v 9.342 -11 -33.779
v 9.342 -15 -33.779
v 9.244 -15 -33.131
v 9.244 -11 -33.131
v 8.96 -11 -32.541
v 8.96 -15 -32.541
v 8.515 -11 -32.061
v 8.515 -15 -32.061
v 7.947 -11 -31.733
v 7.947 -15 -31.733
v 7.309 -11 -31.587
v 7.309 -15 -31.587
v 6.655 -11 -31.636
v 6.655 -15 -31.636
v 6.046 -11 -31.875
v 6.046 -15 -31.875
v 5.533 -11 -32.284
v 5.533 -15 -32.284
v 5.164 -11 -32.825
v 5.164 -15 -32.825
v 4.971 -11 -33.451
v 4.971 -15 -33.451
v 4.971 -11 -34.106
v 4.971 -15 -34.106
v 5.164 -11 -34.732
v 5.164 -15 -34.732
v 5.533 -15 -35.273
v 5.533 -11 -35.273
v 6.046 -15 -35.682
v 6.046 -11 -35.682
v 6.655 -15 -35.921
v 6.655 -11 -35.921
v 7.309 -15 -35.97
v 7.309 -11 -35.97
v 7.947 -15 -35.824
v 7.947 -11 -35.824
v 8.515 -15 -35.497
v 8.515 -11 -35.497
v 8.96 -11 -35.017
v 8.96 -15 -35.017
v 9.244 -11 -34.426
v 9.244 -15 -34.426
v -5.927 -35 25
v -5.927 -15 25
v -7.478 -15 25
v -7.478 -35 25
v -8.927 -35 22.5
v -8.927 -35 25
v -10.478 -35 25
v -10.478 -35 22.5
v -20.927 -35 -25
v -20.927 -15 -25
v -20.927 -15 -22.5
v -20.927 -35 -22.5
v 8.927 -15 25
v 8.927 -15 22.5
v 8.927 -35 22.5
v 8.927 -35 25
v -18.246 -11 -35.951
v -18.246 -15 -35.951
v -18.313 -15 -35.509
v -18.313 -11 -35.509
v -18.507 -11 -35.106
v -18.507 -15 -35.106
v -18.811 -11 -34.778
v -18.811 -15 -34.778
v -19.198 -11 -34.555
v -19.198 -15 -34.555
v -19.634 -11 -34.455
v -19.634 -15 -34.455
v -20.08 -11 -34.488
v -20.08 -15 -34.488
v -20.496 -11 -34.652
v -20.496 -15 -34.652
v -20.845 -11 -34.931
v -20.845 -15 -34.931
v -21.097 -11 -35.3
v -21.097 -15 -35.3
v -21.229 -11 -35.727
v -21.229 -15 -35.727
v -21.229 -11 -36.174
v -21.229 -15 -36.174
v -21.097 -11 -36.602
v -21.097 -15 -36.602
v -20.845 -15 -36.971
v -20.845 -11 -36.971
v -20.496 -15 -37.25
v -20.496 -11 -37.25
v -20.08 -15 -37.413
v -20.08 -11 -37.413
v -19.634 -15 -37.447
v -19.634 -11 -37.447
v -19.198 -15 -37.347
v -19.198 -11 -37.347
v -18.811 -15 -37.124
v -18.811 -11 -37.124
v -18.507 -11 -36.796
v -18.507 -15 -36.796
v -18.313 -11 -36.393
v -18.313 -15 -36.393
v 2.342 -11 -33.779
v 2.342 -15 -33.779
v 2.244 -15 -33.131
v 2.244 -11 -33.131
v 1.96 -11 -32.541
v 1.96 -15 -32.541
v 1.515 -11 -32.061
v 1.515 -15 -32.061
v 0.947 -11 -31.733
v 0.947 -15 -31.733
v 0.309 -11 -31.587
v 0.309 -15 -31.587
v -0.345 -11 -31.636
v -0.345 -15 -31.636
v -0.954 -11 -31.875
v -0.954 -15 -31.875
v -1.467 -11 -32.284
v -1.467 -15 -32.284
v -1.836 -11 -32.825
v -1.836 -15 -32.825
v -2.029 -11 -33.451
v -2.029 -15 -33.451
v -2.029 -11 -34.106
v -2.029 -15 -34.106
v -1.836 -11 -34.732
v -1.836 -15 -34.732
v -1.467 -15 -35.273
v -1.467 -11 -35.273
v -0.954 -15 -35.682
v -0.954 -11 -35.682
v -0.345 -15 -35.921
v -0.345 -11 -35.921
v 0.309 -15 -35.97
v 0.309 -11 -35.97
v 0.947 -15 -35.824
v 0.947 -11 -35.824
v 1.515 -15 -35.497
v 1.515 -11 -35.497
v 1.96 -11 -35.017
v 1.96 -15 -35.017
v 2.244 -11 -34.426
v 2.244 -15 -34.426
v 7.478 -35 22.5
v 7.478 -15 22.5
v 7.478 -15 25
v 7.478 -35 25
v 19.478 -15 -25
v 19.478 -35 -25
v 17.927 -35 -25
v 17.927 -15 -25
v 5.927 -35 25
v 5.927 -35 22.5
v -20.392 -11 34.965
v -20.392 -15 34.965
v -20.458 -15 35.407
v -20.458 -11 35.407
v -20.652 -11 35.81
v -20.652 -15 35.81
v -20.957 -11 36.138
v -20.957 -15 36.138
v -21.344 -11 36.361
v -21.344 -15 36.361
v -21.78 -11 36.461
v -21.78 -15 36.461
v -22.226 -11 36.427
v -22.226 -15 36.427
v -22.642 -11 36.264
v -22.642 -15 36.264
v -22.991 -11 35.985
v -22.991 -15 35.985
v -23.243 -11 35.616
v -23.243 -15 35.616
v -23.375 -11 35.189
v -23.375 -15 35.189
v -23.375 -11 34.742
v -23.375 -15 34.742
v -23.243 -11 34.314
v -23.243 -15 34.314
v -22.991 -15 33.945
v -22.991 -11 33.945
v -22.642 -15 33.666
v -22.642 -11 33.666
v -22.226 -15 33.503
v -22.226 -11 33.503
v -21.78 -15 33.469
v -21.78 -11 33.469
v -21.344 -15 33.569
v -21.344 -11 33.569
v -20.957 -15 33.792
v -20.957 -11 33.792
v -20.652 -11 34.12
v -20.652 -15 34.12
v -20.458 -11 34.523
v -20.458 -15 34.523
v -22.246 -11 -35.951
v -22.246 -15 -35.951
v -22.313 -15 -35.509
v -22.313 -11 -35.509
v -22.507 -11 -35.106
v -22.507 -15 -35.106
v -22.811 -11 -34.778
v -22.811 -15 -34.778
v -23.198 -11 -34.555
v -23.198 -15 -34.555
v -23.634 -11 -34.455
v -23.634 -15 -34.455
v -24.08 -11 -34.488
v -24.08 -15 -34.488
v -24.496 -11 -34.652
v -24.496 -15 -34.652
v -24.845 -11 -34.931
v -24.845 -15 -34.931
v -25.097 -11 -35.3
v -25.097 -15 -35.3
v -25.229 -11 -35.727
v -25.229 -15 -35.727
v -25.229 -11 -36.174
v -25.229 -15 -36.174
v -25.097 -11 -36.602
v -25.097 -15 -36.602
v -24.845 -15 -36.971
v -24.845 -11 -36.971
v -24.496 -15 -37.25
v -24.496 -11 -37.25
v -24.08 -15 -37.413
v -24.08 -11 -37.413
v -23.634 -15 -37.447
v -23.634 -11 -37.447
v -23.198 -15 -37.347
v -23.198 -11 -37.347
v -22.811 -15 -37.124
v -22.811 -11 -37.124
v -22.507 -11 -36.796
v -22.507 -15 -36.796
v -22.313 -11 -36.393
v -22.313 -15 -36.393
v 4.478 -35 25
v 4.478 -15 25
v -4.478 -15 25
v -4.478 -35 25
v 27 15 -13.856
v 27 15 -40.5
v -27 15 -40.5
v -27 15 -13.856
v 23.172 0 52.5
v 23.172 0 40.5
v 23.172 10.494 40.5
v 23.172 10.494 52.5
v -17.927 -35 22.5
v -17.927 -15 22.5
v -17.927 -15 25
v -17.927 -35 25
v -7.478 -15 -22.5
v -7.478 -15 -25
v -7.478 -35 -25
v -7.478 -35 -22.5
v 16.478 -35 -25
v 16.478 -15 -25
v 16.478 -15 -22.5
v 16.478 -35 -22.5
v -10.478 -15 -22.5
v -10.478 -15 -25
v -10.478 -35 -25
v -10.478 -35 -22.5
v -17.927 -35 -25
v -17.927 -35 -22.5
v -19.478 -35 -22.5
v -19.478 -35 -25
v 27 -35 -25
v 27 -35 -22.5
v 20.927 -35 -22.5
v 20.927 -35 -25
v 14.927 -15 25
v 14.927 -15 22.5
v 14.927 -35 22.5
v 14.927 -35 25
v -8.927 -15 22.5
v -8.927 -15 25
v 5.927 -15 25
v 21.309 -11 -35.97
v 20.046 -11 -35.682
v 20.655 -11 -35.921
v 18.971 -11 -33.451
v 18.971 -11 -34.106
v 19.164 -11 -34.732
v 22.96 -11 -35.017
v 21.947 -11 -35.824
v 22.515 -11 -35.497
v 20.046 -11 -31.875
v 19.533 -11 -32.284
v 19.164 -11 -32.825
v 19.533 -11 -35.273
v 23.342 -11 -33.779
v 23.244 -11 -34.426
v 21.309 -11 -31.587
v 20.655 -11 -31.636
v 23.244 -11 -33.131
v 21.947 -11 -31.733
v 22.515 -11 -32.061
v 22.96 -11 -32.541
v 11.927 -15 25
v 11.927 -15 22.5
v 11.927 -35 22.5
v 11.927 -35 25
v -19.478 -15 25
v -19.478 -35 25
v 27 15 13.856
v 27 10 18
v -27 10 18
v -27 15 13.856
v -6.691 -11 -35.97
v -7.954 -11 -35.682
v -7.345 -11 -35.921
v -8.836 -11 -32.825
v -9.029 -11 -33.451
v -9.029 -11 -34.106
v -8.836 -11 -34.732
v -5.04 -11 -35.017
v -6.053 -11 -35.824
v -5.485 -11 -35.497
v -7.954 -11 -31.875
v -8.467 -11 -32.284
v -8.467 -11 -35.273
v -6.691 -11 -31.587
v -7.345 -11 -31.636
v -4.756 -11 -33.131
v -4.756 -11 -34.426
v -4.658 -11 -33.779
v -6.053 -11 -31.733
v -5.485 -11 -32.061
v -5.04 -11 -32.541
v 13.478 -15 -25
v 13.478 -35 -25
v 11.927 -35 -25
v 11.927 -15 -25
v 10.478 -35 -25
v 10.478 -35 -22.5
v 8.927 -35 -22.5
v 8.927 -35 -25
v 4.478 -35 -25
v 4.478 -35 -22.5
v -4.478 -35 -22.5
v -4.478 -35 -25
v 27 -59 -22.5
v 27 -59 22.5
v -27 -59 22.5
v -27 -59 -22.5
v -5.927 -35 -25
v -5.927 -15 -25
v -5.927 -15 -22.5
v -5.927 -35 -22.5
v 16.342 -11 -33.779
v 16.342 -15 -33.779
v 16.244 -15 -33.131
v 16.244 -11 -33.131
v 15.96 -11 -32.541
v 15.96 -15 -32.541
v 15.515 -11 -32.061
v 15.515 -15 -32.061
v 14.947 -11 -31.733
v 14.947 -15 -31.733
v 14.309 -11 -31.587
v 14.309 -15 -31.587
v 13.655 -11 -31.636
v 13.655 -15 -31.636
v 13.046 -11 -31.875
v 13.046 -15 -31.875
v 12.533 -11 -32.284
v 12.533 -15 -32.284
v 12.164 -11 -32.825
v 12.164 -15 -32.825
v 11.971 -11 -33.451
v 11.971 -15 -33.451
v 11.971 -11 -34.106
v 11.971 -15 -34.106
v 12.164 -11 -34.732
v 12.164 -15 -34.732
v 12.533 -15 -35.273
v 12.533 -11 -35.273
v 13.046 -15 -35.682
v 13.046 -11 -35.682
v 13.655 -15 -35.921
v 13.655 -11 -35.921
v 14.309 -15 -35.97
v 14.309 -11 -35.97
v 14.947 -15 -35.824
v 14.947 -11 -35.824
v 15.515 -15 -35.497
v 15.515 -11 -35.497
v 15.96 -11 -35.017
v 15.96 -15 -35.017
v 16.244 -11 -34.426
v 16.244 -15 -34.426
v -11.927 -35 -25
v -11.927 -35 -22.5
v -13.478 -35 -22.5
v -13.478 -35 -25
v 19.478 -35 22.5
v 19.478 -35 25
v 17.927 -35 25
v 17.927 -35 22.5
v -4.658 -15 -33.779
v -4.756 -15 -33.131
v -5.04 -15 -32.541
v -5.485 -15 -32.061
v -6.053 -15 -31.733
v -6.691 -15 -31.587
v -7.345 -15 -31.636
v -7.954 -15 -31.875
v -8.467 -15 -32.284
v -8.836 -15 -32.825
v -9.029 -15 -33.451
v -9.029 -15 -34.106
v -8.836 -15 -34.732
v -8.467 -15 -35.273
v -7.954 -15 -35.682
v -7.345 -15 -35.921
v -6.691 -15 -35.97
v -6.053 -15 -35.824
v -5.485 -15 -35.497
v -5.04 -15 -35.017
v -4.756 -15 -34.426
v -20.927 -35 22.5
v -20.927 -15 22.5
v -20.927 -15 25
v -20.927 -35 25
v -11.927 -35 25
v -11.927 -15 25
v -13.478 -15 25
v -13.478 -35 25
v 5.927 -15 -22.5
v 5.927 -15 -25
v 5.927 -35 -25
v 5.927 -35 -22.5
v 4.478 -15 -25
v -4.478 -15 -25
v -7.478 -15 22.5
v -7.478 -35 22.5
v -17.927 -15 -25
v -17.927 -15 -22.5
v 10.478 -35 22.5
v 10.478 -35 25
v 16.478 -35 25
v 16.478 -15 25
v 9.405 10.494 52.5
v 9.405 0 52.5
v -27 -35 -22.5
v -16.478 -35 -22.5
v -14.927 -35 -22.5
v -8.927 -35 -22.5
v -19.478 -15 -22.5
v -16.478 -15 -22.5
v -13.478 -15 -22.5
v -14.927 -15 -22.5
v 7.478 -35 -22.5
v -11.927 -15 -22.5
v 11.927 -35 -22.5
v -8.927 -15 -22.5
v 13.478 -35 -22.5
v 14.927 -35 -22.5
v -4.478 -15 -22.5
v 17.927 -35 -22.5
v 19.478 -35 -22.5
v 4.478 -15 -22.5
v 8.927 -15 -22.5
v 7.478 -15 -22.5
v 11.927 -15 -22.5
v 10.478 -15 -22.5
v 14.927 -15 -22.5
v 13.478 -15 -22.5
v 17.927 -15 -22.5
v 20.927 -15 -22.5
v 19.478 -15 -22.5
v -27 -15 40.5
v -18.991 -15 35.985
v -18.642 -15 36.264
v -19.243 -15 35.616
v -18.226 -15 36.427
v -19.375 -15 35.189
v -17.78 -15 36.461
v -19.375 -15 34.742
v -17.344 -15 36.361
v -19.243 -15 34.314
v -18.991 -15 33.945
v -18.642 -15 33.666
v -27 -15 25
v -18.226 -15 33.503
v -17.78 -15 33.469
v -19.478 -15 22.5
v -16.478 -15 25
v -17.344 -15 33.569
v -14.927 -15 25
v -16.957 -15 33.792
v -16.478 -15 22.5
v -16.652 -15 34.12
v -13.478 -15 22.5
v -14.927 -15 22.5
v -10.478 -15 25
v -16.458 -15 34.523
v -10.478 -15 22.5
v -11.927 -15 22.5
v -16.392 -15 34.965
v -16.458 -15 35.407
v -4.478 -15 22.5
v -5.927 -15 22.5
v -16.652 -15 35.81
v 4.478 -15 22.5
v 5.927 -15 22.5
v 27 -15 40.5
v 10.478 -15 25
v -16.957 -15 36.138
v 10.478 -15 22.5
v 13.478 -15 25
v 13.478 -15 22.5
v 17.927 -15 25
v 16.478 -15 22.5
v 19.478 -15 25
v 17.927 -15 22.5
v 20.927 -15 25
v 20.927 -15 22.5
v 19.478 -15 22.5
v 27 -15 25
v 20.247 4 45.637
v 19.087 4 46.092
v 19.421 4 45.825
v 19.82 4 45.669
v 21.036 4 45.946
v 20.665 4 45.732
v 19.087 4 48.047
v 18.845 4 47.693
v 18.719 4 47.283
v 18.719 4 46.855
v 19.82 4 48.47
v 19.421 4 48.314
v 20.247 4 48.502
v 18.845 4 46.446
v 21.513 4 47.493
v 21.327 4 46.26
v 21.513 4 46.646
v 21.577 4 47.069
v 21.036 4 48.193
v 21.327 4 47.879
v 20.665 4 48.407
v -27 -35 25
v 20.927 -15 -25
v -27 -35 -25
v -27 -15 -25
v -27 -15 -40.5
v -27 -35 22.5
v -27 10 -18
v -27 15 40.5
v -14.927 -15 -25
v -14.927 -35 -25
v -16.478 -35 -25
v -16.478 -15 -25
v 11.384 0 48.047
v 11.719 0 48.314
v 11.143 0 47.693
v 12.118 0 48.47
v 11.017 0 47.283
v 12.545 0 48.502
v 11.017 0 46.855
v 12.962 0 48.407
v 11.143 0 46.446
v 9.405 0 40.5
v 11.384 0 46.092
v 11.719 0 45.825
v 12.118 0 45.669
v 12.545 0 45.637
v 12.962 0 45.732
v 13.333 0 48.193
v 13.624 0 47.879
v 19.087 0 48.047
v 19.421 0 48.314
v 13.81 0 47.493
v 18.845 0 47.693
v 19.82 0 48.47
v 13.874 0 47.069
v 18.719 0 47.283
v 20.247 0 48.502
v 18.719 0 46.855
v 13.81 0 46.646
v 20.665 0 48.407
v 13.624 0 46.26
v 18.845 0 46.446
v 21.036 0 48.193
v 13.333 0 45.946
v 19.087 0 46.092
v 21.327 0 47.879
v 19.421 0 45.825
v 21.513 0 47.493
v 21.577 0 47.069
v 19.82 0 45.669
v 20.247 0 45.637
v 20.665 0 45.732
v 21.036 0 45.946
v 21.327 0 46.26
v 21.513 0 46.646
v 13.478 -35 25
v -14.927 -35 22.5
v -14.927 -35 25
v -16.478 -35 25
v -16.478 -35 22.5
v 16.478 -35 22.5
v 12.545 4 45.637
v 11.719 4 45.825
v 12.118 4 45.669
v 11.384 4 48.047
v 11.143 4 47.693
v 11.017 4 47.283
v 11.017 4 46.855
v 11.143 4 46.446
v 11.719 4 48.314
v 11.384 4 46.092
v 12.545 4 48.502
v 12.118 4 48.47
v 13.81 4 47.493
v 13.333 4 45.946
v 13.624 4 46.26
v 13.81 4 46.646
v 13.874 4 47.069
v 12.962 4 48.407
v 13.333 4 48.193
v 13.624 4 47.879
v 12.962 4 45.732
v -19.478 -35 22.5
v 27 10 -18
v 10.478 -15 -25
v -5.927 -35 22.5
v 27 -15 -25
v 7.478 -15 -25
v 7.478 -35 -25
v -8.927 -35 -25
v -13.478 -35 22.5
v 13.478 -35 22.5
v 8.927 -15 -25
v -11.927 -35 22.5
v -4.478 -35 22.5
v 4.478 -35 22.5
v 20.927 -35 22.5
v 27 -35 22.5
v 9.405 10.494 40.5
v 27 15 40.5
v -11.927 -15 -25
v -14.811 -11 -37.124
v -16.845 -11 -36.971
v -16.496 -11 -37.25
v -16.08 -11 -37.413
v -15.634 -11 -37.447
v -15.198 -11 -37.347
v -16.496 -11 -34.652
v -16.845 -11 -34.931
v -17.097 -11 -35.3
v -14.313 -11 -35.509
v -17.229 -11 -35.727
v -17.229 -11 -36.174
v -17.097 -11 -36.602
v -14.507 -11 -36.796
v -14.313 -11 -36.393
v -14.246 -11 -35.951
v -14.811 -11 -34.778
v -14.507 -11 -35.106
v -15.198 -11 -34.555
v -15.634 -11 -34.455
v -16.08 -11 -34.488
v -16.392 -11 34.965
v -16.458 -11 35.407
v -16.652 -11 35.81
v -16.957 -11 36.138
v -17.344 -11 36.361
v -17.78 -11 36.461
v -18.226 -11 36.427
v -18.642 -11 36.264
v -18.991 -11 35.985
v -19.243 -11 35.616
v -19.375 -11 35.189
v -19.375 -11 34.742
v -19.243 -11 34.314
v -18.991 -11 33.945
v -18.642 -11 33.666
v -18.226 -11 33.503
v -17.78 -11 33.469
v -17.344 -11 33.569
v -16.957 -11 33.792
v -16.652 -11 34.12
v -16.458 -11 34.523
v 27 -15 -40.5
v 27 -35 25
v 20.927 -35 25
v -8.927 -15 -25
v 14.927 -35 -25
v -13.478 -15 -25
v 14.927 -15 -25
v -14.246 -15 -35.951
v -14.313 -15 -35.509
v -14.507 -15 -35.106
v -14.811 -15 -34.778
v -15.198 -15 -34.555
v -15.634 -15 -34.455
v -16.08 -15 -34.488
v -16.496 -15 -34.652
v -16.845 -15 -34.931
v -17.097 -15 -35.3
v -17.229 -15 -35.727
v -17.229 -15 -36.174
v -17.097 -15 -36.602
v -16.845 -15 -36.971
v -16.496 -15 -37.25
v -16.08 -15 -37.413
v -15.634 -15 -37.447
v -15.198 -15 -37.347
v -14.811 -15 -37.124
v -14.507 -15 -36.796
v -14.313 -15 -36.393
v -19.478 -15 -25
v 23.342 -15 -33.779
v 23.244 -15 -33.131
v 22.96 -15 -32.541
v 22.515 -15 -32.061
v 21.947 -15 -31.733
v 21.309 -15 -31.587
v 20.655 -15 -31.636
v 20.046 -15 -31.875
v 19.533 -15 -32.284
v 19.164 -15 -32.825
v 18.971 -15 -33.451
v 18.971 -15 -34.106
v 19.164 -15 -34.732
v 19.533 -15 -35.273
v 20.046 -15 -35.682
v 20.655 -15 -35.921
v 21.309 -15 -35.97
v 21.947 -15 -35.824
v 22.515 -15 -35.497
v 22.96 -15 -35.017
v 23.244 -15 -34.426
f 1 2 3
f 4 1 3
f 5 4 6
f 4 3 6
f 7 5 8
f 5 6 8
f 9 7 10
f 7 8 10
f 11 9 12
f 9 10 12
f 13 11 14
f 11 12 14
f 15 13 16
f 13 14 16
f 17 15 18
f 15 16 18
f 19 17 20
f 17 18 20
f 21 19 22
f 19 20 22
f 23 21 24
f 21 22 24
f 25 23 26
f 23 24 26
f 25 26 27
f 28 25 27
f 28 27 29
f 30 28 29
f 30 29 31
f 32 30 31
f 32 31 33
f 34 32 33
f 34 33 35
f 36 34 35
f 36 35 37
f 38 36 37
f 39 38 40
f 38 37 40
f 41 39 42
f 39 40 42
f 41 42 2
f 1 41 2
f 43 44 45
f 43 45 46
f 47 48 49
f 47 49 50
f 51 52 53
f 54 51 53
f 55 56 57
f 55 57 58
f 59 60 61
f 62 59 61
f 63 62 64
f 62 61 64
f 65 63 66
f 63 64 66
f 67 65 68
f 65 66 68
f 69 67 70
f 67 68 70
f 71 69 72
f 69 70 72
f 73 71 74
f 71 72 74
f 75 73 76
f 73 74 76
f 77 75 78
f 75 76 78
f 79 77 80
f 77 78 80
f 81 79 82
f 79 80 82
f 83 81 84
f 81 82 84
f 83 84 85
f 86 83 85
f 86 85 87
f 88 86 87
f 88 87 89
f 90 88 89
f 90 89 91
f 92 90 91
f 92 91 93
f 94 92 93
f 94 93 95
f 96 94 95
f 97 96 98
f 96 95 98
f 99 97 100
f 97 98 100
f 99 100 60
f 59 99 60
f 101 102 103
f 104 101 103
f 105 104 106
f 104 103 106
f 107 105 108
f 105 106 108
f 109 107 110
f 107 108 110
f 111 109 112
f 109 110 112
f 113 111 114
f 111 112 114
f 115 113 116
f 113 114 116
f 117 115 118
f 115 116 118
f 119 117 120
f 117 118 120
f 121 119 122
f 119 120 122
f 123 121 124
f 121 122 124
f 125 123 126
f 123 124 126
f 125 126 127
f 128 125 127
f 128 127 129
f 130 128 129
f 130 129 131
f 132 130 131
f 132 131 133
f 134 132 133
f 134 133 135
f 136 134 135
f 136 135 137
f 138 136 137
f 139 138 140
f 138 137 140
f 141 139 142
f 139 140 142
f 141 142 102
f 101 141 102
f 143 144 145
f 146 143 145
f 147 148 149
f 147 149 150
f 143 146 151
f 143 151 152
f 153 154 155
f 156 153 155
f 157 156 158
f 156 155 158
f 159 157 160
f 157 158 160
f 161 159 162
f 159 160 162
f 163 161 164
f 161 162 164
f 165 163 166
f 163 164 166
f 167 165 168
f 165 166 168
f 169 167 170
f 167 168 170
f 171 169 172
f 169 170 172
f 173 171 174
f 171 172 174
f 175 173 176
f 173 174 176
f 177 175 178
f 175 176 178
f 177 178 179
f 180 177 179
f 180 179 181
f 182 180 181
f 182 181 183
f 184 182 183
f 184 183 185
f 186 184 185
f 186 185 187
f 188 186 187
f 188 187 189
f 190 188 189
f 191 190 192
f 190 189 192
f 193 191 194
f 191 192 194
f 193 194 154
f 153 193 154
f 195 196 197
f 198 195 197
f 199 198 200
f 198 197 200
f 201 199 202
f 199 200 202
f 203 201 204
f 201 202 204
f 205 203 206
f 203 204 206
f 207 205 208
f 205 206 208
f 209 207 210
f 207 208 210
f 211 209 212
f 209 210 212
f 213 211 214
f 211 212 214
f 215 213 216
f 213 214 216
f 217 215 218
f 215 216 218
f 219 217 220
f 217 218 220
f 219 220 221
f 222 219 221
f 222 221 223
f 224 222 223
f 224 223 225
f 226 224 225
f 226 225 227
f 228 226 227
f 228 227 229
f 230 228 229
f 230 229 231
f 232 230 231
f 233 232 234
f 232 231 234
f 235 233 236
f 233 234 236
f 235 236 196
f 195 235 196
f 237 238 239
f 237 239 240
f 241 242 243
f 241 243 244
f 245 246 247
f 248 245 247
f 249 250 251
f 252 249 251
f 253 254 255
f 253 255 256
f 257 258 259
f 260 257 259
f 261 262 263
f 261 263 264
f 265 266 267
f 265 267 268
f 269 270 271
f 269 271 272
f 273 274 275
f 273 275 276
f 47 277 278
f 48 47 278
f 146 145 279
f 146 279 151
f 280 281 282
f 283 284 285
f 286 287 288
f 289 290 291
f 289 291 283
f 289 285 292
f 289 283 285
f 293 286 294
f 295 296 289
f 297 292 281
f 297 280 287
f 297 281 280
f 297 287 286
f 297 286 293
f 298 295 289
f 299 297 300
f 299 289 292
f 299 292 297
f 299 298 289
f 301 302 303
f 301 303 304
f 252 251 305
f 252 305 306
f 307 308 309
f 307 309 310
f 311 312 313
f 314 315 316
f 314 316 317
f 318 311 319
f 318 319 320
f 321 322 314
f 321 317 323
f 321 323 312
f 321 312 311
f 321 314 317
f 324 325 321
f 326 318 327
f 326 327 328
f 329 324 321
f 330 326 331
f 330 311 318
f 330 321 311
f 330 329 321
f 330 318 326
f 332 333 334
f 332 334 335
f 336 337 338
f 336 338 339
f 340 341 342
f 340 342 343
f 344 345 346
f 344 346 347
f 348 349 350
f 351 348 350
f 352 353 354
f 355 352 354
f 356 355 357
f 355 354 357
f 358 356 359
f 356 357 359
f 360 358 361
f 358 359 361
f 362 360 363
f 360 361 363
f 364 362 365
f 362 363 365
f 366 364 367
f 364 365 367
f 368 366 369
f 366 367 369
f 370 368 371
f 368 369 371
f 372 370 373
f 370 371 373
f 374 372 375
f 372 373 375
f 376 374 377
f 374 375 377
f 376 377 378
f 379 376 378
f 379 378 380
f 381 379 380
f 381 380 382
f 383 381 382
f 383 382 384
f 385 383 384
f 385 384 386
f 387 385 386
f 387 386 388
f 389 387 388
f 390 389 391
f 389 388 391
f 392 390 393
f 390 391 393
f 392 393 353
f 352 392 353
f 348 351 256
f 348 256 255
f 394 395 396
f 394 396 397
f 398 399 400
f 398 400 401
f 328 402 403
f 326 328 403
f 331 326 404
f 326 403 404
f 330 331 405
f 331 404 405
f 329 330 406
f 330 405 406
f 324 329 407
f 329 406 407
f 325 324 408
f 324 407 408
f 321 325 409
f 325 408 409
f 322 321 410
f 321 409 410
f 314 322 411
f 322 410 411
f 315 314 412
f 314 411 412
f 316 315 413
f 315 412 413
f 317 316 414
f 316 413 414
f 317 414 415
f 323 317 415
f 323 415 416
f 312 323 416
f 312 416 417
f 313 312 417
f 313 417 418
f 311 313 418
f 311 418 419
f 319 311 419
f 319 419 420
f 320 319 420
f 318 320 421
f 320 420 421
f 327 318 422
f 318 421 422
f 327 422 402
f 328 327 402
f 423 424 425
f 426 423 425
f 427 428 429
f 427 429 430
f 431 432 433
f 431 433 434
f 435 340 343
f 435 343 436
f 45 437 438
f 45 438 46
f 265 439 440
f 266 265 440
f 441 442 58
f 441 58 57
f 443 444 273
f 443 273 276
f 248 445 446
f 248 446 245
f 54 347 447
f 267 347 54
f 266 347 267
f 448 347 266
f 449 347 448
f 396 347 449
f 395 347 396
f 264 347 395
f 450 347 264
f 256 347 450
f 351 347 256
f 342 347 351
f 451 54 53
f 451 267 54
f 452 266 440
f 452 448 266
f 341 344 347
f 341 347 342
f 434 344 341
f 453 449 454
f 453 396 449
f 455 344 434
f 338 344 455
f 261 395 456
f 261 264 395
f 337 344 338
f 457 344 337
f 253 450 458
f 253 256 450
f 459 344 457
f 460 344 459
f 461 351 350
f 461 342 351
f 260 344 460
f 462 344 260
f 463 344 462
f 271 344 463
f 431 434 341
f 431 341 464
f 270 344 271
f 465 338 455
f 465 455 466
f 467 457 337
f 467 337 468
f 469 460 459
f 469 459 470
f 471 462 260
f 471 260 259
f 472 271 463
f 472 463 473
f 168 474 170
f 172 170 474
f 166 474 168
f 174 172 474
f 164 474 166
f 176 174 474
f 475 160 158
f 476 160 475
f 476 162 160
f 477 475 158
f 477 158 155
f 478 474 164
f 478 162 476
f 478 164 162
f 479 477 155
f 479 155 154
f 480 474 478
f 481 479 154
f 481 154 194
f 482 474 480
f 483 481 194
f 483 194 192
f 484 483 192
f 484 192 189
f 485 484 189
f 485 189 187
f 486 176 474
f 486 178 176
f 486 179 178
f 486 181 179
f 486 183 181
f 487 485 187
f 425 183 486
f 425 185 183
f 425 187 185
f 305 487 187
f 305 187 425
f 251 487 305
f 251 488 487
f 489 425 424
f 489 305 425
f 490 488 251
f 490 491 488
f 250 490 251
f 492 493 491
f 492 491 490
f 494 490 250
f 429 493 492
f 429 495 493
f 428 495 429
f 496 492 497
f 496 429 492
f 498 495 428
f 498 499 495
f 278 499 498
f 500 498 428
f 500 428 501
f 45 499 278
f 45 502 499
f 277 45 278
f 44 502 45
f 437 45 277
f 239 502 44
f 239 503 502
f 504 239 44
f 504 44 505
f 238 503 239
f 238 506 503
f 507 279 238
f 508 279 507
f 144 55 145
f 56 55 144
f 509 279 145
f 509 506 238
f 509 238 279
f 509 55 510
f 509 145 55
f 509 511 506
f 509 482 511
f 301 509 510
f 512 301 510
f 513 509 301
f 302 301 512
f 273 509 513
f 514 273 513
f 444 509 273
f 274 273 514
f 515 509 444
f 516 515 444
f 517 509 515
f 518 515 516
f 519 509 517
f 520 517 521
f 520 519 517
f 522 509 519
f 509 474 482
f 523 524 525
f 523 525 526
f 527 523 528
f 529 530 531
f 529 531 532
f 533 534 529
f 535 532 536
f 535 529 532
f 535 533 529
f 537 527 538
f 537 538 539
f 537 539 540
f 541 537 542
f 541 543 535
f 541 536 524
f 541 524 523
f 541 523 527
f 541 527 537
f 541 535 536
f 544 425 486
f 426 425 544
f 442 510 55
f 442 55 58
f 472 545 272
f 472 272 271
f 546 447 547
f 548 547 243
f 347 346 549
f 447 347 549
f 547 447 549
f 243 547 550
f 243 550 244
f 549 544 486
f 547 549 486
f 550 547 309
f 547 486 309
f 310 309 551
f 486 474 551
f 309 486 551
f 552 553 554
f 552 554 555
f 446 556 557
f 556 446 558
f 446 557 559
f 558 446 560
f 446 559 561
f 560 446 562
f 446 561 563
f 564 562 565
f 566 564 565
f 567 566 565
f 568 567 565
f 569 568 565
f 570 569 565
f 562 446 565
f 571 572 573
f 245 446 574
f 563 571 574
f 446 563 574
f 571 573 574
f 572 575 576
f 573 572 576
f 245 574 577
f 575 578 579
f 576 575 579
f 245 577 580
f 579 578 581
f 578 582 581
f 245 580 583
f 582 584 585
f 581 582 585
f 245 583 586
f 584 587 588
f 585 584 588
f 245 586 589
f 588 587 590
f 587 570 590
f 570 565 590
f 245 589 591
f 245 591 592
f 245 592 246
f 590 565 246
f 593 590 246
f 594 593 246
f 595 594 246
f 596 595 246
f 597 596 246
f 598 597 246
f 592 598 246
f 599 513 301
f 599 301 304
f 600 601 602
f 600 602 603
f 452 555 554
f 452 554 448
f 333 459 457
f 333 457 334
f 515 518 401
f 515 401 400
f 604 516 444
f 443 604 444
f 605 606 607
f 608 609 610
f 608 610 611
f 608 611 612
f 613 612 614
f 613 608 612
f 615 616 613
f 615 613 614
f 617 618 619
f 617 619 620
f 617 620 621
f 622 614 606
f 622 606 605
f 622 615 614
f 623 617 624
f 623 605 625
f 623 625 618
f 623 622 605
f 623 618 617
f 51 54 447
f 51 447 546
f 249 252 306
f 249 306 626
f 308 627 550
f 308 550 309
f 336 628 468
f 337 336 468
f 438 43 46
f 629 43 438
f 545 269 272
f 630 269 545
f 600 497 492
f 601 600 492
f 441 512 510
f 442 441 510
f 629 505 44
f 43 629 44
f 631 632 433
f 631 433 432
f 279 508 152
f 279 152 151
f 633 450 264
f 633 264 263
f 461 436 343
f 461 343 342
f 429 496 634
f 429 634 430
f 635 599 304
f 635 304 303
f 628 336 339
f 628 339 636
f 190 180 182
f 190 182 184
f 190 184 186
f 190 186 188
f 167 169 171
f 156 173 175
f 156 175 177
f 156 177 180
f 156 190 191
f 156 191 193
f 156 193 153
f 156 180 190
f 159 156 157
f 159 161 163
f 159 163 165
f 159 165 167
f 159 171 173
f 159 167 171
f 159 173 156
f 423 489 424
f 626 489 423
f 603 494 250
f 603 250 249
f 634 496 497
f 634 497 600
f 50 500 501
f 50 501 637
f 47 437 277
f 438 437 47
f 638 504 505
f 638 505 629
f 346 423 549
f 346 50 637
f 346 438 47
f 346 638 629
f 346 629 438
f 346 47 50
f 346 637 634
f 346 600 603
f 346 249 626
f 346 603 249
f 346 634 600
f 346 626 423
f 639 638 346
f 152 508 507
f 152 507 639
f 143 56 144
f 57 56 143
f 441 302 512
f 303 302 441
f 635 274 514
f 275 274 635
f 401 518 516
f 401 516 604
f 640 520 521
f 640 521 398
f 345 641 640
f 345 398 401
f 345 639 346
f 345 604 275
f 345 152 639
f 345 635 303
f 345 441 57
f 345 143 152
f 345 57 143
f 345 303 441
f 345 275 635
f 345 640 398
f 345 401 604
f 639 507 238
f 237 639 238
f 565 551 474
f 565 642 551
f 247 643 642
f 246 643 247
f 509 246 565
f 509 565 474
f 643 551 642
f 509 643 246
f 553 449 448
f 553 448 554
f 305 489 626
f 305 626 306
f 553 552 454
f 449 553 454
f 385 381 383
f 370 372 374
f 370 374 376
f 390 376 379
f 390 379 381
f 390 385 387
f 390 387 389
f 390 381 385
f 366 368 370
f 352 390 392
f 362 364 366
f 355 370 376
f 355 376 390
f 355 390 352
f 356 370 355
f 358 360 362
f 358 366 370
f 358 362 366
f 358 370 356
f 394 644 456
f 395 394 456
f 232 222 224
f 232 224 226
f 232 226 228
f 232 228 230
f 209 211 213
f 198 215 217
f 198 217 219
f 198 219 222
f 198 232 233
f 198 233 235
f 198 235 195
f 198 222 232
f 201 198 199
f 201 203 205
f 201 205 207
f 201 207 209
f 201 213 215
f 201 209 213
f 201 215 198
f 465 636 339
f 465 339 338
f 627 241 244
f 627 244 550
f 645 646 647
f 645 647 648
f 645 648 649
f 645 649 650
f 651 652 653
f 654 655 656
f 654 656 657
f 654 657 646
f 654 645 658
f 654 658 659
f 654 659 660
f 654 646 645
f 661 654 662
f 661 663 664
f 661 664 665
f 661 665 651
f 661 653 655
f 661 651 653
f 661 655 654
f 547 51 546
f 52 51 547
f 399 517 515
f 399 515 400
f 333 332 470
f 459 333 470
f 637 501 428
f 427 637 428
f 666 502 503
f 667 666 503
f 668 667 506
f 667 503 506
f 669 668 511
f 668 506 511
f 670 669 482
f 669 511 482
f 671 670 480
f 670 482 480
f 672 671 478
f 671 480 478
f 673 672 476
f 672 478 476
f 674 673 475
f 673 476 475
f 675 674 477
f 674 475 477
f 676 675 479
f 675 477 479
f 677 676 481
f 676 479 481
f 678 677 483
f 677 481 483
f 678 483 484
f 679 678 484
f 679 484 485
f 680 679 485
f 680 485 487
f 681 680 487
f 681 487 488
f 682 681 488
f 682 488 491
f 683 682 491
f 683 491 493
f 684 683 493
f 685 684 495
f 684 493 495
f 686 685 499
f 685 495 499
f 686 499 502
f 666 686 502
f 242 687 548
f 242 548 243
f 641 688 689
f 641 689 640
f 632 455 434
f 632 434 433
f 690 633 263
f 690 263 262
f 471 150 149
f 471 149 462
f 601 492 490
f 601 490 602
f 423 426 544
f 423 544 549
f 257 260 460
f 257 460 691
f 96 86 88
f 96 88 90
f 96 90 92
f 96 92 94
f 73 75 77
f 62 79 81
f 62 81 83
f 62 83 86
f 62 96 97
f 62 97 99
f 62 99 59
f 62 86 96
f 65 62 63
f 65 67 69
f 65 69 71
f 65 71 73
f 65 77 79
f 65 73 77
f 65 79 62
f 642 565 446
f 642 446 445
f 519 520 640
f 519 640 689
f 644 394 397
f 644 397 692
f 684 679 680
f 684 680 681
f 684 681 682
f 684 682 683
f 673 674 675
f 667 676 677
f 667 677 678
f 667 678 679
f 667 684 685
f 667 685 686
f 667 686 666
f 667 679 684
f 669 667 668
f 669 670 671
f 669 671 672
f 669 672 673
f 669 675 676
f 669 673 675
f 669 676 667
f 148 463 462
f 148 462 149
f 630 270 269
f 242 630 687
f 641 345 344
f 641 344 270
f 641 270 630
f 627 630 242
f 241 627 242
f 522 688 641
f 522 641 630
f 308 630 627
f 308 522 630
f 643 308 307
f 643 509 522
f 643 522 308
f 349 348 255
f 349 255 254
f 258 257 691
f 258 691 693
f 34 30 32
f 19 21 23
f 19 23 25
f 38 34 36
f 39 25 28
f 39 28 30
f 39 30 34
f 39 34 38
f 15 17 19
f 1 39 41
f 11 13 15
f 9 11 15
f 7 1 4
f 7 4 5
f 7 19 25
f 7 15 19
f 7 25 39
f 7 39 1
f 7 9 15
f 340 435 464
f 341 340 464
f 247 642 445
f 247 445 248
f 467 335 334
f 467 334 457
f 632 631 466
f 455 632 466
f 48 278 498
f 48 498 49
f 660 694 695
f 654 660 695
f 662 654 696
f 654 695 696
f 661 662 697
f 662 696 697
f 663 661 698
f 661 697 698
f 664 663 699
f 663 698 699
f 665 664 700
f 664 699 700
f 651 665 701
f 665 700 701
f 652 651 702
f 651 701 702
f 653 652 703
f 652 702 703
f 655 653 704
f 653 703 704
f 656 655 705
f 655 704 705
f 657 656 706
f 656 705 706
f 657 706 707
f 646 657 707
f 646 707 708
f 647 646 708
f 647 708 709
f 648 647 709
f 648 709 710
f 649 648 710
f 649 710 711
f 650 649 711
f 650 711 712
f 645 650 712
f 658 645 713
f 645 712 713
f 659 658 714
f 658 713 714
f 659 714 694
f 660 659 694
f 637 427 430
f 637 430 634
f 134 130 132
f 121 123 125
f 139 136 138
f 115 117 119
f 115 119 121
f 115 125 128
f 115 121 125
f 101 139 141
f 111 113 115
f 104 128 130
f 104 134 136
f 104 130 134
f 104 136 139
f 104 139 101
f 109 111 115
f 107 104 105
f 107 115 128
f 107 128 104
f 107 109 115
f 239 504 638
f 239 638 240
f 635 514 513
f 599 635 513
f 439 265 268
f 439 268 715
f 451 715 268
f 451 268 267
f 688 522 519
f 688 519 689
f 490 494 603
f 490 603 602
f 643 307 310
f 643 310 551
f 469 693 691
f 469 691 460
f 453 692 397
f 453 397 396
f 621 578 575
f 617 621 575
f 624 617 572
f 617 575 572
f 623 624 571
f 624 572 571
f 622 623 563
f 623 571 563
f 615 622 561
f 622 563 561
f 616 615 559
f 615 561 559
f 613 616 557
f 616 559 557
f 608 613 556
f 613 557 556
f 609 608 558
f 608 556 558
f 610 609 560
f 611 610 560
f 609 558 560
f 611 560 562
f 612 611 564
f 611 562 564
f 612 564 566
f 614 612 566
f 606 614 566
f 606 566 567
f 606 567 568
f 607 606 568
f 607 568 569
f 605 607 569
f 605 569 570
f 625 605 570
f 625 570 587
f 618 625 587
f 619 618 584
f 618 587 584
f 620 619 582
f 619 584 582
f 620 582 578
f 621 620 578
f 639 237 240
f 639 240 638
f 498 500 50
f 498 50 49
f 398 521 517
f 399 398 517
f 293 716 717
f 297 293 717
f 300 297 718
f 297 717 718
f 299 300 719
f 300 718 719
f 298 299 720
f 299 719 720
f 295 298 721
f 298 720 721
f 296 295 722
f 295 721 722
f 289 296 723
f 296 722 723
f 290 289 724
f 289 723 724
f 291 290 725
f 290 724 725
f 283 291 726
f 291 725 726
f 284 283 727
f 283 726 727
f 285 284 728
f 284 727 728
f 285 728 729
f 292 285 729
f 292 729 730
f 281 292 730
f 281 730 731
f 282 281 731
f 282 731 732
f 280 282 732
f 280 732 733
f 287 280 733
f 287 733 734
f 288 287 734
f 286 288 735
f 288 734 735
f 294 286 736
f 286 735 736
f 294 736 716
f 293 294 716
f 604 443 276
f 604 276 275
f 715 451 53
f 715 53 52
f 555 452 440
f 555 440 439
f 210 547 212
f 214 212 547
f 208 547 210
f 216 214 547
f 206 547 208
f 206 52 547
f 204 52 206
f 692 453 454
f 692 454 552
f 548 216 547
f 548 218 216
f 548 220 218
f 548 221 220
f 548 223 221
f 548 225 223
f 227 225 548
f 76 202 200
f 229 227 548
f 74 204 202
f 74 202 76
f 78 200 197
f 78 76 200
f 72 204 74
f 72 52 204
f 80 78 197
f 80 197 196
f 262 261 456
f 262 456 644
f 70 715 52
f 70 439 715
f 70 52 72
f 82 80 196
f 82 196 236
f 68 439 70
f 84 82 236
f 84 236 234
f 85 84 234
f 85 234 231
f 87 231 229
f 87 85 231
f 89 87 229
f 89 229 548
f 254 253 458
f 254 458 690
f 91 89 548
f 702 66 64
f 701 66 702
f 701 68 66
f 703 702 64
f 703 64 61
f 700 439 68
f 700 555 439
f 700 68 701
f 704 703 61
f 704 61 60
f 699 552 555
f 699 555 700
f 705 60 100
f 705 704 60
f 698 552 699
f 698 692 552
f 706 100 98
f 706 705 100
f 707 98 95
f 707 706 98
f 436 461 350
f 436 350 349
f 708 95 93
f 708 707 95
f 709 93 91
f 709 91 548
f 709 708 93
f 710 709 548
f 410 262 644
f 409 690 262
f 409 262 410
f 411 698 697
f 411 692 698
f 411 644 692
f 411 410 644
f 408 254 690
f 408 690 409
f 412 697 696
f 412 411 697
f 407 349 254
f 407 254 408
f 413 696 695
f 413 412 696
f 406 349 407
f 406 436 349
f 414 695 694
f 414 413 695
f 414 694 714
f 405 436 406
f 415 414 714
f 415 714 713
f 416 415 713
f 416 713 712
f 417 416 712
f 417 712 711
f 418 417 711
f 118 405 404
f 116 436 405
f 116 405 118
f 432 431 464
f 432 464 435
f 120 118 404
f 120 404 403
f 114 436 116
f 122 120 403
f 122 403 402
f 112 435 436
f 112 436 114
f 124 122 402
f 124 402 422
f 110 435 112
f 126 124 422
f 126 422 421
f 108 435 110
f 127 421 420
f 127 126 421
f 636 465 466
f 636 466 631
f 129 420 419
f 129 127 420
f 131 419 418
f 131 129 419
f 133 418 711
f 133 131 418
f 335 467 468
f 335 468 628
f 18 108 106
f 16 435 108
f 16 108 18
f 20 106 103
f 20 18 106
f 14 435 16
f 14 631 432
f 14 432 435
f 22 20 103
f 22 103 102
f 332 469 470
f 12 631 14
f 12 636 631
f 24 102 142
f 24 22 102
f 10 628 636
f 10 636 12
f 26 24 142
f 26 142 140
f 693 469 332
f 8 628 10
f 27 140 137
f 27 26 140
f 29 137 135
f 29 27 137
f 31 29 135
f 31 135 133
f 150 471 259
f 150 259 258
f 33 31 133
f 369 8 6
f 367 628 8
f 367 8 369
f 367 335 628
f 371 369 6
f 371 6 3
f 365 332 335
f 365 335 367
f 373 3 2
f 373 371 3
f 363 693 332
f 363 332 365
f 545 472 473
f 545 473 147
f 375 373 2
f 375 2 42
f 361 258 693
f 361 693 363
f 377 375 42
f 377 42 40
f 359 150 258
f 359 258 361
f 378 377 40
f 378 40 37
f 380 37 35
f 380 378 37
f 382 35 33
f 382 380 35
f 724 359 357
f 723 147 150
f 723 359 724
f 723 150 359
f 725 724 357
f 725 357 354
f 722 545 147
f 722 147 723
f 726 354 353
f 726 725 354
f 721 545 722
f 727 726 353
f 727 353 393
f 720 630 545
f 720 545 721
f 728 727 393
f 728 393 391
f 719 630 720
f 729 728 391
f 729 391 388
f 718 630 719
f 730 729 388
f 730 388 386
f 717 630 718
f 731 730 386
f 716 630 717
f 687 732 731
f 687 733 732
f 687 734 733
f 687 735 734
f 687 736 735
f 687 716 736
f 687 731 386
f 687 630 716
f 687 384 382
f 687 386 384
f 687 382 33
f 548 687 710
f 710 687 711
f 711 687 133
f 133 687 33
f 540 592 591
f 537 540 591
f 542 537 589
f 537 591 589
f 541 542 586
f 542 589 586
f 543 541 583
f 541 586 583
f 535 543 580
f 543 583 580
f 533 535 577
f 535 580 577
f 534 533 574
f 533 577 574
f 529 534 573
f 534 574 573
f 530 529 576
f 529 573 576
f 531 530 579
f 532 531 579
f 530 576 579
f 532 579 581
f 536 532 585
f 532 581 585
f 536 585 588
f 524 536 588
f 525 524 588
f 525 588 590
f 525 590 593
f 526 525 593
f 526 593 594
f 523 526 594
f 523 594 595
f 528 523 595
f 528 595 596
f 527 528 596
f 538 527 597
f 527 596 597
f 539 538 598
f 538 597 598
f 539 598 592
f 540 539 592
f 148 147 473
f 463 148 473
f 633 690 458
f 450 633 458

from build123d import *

# Parameters (mm, degrees)
F1_DEPTH = 27
F4_W     = 13.767542
F4_H     = 10.494464
F5_DEPTH = 12
F2_R     = 1.5
F2_R_2   = 2.197624
F6_R     = 1.436768
F3_R     = 1.5
F7_DEPTH = 4
F8_W     = 1.44863
F8_H     = 2.5
F9_DEPTH = 20


with BuildPart() as f1:
    # F0 (on Right) → F1 (new body, symmetric)
    with BuildSketch(Plane.YZ):
        Polygon((-15, -25), (-15, -40.5), (15, -40.5), (15, -13.856175), (10, -18), (10, 18), (15, 13.856175), (15, 40.5), (-15, 40.5), (-15, 25), (-35, 25), (-35, 22.5), (-59, 22.5), (-59, -22.5), (-35, -22.5), (-35, -25), align=None)
    extrude(amount=F1_DEPTH, both=True)

    # F4 (on face) → F5 (join)
    with BuildSketch(Plane.XY.offset(40.5)):
        with Locations((16.288548, 5.247232)):
            Rectangle(F4_W, F4_H)
    extrude(amount=F5_DEPTH)

    # F2 (on face) + F6 (on face) + F3 (on face) → F7 (cut)
    with BuildSketch(Plane.XZ.offset(15)):
        with Locations((-23.745881, -35.95088)):
            Circle(F2_R)
        with Locations((-19.745881, -35.95088)):
            Circle(F2_R)
        with Locations((-15.745881, -35.95088)):
            Circle(F2_R)
        with Locations((-6.855602, -33.778694)):
            Circle(F2_R_2)
        with Locations((0.144398, -33.778694)):
            Circle(F2_R_2)
        with Locations((7.144398, -33.778694)):
            Circle(F2_R_2)
        with Locations((14.144398, -33.778694)):
            Circle(F2_R_2)
        with Locations((21.144398, -33.778694)):
            Circle(F2_R_2)
    with BuildSketch(Plane.XZ):
        with Locations((12.437331, 47.069304)):
            Circle(F6_R)
        with Locations((20.139764, 47.069304)):
            Circle(F6_R)
    with BuildSketch(Plane.XZ.offset(15)):
        with Locations((-21.891808, 34.965087)):
            Circle(F3_R)
        with Locations((-17.891808, 34.965087)):
            Circle(F3_R)
    extrude(amount=-F7_DEPTH, mode=Mode.SUBTRACT)

    # F8 (on face) → F9 (cut, through all)
    with BuildSketch(Plane.XZ.offset(35)):
        with Locations((-5.202554, 23.75)):
            Rectangle(F8_W, F8_H)
        with Locations((-8.202554, 23.75)):
            Rectangle(F8_W, F8_H)
        with Locations((-11.202554, 23.75)):
            Rectangle(F8_W, F8_H)
        with Locations((-14.202554, 23.75)):
            Rectangle(F8_W, F8_H)
        with Locations((-17.202554, 23.75)):
            Rectangle(F8_W, F8_H)
        with Locations((-20.202554, 23.75)):
            Rectangle(F8_W, F8_H)
        with Locations((5.202554, 23.75)):
            Rectangle(F8_W, F8_H)
        with Locations((8.202554, 23.75)):
            Rectangle(F8_W, F8_H)
        with Locations((11.202554, 23.75)):
            Rectangle(F8_W, F8_H)
        with Locations((14.202554, 23.75)):
            Rectangle(F8_W, F8_H)
        with Locations((17.202554, 23.75)):
            Rectangle(F8_W, F8_H)
        with Locations((20.202554, 23.75)):
            Rectangle(F8_W, F8_H)
        with Locations((-20.202554, -23.75)):
            Rectangle(F8_W, F8_H)
        with Locations((-17.202554, -23.75)):
            Rectangle(F8_W, F8_H)
        with Locations((-14.202554, -23.75)):
            Rectangle(F8_W, F8_H)
        with Locations((-11.202554, -23.75)):
            Rectangle(F8_W, F8_H)
        with Locations((-8.202554, -23.75)):
            Rectangle(F8_W, F8_H)
        with Locations((-5.202554, -23.75)):
            Rectangle(F8_W, F8_H)
        with Locations((5.202554, -23.75)):
            Rectangle(F8_W, F8_H)
        with Locations((8.202554, -23.75)):
            Rectangle(F8_W, F8_H)
        with Locations((11.202554, -23.75)):
            Rectangle(F8_W, F8_H)
        with Locations((14.202554, -23.75)):
            Rectangle(F8_W, F8_H)
        with Locations((17.202554, -23.75)):
            Rectangle(F8_W, F8_H)
        with Locations((20.202554, -23.75)):
            Rectangle(F8_W, F8_H)
    extrude(amount=-F9_DEPTH, mode=Mode.SUBTRACT)


solid = f1.part
